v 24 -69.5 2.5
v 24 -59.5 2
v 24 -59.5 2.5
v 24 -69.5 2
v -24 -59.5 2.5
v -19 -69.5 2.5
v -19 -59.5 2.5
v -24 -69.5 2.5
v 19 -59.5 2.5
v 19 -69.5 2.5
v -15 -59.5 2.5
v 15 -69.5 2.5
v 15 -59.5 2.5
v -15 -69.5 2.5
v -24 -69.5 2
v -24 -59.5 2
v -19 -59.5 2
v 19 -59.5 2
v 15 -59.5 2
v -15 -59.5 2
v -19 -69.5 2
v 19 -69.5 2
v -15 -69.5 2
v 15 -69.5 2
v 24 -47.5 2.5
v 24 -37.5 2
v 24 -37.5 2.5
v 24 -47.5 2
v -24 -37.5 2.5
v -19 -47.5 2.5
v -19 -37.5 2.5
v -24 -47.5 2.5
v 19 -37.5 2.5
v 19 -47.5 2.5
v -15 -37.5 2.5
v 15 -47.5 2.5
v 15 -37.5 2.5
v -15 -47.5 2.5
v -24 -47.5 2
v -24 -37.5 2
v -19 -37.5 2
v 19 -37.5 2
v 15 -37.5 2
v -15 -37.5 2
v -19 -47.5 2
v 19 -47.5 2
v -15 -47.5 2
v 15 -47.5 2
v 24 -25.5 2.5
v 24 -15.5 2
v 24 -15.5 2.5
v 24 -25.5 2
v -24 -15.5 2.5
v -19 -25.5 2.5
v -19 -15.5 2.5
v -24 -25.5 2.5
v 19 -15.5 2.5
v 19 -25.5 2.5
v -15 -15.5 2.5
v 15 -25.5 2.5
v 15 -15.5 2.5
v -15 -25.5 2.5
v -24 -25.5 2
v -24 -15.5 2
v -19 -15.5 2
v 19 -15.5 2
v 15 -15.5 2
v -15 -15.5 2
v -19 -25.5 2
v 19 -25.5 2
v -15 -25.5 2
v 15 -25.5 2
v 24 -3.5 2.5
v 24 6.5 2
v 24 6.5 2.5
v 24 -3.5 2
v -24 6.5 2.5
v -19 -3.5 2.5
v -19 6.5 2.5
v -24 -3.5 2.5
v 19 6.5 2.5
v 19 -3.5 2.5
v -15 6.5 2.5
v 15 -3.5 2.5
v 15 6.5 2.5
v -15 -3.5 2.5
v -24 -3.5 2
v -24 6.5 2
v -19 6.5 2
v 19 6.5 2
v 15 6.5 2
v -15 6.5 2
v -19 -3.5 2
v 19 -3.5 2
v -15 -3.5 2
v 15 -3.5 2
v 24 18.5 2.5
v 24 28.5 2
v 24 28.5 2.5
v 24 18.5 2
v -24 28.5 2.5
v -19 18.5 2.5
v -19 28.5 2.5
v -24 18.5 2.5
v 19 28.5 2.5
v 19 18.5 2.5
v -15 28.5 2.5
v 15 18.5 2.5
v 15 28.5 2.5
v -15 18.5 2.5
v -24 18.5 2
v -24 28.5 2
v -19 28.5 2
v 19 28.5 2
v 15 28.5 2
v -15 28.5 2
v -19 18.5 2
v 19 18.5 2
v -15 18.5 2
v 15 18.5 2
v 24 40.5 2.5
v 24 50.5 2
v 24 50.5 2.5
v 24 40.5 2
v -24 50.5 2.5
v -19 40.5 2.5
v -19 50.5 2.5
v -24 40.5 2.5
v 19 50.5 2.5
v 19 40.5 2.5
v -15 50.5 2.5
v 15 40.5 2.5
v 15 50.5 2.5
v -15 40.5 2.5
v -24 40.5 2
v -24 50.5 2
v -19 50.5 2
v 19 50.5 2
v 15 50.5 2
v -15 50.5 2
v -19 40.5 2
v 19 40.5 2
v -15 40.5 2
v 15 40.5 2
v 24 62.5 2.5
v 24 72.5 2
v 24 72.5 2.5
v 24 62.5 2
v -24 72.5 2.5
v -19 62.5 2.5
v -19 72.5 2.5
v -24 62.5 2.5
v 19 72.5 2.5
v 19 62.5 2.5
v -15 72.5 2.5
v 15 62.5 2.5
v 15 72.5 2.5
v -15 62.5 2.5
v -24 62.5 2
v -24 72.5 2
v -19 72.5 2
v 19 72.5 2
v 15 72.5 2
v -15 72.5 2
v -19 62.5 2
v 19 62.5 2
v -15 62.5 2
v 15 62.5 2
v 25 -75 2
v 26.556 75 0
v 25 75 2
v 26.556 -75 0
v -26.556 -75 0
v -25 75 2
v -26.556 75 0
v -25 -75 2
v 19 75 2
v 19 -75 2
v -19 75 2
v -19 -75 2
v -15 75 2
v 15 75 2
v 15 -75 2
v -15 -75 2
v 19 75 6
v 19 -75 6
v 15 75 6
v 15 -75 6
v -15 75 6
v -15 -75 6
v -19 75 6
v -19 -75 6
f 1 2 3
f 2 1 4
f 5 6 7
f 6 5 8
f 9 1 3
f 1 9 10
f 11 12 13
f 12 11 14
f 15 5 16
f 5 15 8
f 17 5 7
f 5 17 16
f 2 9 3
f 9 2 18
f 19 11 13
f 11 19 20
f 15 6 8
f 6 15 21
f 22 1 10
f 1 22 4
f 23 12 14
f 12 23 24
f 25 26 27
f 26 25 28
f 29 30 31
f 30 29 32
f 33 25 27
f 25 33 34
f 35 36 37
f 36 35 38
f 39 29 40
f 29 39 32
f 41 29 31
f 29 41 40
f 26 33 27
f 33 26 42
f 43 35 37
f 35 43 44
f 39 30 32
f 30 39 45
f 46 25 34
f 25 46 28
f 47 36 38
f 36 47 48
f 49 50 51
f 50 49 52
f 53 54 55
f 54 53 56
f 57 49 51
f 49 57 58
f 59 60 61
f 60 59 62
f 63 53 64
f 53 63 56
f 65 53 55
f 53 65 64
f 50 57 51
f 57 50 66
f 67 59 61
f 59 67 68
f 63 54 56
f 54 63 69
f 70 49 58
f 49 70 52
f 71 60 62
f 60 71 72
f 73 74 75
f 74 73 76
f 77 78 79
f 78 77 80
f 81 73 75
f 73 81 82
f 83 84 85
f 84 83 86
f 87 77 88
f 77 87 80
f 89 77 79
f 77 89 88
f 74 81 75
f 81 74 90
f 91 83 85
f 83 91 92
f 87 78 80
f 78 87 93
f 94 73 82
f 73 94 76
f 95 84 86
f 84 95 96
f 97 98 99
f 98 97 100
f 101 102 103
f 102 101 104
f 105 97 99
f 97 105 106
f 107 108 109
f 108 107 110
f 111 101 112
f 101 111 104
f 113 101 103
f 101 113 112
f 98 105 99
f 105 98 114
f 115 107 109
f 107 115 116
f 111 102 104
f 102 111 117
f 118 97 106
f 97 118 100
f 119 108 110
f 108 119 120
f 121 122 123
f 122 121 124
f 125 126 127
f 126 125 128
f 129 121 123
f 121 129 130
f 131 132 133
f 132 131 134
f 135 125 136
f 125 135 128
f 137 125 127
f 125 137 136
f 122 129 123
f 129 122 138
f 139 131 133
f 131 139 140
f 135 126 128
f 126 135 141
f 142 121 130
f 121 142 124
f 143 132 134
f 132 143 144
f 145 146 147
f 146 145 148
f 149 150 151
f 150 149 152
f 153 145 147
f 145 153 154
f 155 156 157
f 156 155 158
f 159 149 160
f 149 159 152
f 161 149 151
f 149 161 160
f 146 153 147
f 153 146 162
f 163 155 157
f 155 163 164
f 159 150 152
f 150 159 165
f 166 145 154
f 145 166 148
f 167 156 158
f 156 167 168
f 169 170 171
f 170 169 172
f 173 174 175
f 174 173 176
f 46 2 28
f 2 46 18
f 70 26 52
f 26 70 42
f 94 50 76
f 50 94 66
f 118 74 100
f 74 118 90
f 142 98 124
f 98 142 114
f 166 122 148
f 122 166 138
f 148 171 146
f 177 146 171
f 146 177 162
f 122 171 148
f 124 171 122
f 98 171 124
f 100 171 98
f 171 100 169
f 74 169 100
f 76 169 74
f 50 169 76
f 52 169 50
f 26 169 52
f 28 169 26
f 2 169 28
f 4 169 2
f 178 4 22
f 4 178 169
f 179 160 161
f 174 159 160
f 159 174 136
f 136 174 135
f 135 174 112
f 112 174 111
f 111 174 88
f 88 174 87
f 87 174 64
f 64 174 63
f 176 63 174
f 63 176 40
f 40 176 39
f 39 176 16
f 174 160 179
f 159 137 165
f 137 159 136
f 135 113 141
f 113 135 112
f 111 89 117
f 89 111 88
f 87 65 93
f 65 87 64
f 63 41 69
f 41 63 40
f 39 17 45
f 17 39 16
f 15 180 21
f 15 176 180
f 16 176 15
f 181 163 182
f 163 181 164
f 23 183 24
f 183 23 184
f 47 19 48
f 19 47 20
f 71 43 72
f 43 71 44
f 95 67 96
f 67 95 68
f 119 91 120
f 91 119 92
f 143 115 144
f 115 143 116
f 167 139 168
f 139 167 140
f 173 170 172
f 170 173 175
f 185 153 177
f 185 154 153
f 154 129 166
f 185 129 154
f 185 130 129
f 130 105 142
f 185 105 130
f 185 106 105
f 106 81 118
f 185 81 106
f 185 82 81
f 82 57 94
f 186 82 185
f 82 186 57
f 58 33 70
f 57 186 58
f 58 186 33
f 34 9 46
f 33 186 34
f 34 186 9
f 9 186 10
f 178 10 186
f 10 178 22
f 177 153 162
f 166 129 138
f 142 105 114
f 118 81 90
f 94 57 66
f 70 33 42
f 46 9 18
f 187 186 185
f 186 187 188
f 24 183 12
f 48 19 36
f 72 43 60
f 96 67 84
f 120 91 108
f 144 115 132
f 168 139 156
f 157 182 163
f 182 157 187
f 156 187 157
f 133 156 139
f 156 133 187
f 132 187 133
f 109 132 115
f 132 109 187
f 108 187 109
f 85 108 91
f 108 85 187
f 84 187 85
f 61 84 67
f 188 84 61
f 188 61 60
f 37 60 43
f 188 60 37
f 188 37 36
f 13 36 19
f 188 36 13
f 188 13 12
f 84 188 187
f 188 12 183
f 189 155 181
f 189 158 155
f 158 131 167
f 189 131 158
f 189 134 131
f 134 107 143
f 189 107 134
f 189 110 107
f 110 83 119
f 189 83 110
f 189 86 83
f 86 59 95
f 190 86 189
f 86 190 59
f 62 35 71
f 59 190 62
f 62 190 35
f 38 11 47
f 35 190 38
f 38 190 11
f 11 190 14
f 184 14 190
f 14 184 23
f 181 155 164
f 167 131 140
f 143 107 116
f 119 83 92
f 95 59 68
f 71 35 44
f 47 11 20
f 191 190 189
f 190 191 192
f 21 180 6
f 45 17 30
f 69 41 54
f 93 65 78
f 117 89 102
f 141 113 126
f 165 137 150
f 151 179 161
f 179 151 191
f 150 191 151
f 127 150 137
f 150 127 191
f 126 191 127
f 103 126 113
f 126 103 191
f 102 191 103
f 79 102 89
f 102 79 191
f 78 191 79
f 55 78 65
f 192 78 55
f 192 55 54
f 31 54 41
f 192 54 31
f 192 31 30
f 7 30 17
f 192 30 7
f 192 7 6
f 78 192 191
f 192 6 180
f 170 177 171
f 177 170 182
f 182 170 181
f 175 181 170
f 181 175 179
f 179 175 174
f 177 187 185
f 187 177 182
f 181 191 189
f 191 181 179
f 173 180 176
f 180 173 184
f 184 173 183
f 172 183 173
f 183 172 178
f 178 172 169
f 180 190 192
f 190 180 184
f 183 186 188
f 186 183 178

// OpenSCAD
//
// Long track, made to be compatible with Geotrax®
// (Work in progress : no join system between tracks)
// Author: Francois Crevola (francois@crevola.org)
//

// Try d = 0 for more Geotraxed version
// Try d = -7 for simplified version (more 3D-printer friendly)
d = -7;

intersection() {
  translate([0,0,d]) longTrack();
  translate([0,0,10]) cube(size=[150,150,20], center=true);
}

module longTrack() {

long = 153;

// main piece
	rotate([90,0,0])
	translate([0, 0, -long/2]) // center
	linear_extrude(height=long)
		polygon(points=[[0,7],[-25,7],[-30,0],[-32,0],[-25,9],[-19,9],[-19,13],[-15,13],[-15,9],[15,9],[15,13],[19,13],[19,9],[25,9],[32,0],[30,0],[25,7]], paths=[[0,1,2,3,4,5,6,7,8,9,10,11,12,13,14,15,16,17,18,19,20]]);


// + traverses
spacing = 22;
max = 7;
delta = 10;
for (i = [1:max]) // n iterations
{
	translate([0,-long/2+(i*spacing)-delta,9])
	cube(size = [48, 10, 1], center = true);
}

// + supports
for (i = [-1, 0, 1]) {
	translate([0,i*(long/3),0])
	rotate([90,0,0])
	linear_extrude(height=2.5)
		polygon(points=[[-32,0],[-25,9],[25,9],[32,0]], paths=[[0,1,2,3,4,5,6,7,8,9,10,11,12,13,14,15,16,17,18,19,20]]);
}

}
